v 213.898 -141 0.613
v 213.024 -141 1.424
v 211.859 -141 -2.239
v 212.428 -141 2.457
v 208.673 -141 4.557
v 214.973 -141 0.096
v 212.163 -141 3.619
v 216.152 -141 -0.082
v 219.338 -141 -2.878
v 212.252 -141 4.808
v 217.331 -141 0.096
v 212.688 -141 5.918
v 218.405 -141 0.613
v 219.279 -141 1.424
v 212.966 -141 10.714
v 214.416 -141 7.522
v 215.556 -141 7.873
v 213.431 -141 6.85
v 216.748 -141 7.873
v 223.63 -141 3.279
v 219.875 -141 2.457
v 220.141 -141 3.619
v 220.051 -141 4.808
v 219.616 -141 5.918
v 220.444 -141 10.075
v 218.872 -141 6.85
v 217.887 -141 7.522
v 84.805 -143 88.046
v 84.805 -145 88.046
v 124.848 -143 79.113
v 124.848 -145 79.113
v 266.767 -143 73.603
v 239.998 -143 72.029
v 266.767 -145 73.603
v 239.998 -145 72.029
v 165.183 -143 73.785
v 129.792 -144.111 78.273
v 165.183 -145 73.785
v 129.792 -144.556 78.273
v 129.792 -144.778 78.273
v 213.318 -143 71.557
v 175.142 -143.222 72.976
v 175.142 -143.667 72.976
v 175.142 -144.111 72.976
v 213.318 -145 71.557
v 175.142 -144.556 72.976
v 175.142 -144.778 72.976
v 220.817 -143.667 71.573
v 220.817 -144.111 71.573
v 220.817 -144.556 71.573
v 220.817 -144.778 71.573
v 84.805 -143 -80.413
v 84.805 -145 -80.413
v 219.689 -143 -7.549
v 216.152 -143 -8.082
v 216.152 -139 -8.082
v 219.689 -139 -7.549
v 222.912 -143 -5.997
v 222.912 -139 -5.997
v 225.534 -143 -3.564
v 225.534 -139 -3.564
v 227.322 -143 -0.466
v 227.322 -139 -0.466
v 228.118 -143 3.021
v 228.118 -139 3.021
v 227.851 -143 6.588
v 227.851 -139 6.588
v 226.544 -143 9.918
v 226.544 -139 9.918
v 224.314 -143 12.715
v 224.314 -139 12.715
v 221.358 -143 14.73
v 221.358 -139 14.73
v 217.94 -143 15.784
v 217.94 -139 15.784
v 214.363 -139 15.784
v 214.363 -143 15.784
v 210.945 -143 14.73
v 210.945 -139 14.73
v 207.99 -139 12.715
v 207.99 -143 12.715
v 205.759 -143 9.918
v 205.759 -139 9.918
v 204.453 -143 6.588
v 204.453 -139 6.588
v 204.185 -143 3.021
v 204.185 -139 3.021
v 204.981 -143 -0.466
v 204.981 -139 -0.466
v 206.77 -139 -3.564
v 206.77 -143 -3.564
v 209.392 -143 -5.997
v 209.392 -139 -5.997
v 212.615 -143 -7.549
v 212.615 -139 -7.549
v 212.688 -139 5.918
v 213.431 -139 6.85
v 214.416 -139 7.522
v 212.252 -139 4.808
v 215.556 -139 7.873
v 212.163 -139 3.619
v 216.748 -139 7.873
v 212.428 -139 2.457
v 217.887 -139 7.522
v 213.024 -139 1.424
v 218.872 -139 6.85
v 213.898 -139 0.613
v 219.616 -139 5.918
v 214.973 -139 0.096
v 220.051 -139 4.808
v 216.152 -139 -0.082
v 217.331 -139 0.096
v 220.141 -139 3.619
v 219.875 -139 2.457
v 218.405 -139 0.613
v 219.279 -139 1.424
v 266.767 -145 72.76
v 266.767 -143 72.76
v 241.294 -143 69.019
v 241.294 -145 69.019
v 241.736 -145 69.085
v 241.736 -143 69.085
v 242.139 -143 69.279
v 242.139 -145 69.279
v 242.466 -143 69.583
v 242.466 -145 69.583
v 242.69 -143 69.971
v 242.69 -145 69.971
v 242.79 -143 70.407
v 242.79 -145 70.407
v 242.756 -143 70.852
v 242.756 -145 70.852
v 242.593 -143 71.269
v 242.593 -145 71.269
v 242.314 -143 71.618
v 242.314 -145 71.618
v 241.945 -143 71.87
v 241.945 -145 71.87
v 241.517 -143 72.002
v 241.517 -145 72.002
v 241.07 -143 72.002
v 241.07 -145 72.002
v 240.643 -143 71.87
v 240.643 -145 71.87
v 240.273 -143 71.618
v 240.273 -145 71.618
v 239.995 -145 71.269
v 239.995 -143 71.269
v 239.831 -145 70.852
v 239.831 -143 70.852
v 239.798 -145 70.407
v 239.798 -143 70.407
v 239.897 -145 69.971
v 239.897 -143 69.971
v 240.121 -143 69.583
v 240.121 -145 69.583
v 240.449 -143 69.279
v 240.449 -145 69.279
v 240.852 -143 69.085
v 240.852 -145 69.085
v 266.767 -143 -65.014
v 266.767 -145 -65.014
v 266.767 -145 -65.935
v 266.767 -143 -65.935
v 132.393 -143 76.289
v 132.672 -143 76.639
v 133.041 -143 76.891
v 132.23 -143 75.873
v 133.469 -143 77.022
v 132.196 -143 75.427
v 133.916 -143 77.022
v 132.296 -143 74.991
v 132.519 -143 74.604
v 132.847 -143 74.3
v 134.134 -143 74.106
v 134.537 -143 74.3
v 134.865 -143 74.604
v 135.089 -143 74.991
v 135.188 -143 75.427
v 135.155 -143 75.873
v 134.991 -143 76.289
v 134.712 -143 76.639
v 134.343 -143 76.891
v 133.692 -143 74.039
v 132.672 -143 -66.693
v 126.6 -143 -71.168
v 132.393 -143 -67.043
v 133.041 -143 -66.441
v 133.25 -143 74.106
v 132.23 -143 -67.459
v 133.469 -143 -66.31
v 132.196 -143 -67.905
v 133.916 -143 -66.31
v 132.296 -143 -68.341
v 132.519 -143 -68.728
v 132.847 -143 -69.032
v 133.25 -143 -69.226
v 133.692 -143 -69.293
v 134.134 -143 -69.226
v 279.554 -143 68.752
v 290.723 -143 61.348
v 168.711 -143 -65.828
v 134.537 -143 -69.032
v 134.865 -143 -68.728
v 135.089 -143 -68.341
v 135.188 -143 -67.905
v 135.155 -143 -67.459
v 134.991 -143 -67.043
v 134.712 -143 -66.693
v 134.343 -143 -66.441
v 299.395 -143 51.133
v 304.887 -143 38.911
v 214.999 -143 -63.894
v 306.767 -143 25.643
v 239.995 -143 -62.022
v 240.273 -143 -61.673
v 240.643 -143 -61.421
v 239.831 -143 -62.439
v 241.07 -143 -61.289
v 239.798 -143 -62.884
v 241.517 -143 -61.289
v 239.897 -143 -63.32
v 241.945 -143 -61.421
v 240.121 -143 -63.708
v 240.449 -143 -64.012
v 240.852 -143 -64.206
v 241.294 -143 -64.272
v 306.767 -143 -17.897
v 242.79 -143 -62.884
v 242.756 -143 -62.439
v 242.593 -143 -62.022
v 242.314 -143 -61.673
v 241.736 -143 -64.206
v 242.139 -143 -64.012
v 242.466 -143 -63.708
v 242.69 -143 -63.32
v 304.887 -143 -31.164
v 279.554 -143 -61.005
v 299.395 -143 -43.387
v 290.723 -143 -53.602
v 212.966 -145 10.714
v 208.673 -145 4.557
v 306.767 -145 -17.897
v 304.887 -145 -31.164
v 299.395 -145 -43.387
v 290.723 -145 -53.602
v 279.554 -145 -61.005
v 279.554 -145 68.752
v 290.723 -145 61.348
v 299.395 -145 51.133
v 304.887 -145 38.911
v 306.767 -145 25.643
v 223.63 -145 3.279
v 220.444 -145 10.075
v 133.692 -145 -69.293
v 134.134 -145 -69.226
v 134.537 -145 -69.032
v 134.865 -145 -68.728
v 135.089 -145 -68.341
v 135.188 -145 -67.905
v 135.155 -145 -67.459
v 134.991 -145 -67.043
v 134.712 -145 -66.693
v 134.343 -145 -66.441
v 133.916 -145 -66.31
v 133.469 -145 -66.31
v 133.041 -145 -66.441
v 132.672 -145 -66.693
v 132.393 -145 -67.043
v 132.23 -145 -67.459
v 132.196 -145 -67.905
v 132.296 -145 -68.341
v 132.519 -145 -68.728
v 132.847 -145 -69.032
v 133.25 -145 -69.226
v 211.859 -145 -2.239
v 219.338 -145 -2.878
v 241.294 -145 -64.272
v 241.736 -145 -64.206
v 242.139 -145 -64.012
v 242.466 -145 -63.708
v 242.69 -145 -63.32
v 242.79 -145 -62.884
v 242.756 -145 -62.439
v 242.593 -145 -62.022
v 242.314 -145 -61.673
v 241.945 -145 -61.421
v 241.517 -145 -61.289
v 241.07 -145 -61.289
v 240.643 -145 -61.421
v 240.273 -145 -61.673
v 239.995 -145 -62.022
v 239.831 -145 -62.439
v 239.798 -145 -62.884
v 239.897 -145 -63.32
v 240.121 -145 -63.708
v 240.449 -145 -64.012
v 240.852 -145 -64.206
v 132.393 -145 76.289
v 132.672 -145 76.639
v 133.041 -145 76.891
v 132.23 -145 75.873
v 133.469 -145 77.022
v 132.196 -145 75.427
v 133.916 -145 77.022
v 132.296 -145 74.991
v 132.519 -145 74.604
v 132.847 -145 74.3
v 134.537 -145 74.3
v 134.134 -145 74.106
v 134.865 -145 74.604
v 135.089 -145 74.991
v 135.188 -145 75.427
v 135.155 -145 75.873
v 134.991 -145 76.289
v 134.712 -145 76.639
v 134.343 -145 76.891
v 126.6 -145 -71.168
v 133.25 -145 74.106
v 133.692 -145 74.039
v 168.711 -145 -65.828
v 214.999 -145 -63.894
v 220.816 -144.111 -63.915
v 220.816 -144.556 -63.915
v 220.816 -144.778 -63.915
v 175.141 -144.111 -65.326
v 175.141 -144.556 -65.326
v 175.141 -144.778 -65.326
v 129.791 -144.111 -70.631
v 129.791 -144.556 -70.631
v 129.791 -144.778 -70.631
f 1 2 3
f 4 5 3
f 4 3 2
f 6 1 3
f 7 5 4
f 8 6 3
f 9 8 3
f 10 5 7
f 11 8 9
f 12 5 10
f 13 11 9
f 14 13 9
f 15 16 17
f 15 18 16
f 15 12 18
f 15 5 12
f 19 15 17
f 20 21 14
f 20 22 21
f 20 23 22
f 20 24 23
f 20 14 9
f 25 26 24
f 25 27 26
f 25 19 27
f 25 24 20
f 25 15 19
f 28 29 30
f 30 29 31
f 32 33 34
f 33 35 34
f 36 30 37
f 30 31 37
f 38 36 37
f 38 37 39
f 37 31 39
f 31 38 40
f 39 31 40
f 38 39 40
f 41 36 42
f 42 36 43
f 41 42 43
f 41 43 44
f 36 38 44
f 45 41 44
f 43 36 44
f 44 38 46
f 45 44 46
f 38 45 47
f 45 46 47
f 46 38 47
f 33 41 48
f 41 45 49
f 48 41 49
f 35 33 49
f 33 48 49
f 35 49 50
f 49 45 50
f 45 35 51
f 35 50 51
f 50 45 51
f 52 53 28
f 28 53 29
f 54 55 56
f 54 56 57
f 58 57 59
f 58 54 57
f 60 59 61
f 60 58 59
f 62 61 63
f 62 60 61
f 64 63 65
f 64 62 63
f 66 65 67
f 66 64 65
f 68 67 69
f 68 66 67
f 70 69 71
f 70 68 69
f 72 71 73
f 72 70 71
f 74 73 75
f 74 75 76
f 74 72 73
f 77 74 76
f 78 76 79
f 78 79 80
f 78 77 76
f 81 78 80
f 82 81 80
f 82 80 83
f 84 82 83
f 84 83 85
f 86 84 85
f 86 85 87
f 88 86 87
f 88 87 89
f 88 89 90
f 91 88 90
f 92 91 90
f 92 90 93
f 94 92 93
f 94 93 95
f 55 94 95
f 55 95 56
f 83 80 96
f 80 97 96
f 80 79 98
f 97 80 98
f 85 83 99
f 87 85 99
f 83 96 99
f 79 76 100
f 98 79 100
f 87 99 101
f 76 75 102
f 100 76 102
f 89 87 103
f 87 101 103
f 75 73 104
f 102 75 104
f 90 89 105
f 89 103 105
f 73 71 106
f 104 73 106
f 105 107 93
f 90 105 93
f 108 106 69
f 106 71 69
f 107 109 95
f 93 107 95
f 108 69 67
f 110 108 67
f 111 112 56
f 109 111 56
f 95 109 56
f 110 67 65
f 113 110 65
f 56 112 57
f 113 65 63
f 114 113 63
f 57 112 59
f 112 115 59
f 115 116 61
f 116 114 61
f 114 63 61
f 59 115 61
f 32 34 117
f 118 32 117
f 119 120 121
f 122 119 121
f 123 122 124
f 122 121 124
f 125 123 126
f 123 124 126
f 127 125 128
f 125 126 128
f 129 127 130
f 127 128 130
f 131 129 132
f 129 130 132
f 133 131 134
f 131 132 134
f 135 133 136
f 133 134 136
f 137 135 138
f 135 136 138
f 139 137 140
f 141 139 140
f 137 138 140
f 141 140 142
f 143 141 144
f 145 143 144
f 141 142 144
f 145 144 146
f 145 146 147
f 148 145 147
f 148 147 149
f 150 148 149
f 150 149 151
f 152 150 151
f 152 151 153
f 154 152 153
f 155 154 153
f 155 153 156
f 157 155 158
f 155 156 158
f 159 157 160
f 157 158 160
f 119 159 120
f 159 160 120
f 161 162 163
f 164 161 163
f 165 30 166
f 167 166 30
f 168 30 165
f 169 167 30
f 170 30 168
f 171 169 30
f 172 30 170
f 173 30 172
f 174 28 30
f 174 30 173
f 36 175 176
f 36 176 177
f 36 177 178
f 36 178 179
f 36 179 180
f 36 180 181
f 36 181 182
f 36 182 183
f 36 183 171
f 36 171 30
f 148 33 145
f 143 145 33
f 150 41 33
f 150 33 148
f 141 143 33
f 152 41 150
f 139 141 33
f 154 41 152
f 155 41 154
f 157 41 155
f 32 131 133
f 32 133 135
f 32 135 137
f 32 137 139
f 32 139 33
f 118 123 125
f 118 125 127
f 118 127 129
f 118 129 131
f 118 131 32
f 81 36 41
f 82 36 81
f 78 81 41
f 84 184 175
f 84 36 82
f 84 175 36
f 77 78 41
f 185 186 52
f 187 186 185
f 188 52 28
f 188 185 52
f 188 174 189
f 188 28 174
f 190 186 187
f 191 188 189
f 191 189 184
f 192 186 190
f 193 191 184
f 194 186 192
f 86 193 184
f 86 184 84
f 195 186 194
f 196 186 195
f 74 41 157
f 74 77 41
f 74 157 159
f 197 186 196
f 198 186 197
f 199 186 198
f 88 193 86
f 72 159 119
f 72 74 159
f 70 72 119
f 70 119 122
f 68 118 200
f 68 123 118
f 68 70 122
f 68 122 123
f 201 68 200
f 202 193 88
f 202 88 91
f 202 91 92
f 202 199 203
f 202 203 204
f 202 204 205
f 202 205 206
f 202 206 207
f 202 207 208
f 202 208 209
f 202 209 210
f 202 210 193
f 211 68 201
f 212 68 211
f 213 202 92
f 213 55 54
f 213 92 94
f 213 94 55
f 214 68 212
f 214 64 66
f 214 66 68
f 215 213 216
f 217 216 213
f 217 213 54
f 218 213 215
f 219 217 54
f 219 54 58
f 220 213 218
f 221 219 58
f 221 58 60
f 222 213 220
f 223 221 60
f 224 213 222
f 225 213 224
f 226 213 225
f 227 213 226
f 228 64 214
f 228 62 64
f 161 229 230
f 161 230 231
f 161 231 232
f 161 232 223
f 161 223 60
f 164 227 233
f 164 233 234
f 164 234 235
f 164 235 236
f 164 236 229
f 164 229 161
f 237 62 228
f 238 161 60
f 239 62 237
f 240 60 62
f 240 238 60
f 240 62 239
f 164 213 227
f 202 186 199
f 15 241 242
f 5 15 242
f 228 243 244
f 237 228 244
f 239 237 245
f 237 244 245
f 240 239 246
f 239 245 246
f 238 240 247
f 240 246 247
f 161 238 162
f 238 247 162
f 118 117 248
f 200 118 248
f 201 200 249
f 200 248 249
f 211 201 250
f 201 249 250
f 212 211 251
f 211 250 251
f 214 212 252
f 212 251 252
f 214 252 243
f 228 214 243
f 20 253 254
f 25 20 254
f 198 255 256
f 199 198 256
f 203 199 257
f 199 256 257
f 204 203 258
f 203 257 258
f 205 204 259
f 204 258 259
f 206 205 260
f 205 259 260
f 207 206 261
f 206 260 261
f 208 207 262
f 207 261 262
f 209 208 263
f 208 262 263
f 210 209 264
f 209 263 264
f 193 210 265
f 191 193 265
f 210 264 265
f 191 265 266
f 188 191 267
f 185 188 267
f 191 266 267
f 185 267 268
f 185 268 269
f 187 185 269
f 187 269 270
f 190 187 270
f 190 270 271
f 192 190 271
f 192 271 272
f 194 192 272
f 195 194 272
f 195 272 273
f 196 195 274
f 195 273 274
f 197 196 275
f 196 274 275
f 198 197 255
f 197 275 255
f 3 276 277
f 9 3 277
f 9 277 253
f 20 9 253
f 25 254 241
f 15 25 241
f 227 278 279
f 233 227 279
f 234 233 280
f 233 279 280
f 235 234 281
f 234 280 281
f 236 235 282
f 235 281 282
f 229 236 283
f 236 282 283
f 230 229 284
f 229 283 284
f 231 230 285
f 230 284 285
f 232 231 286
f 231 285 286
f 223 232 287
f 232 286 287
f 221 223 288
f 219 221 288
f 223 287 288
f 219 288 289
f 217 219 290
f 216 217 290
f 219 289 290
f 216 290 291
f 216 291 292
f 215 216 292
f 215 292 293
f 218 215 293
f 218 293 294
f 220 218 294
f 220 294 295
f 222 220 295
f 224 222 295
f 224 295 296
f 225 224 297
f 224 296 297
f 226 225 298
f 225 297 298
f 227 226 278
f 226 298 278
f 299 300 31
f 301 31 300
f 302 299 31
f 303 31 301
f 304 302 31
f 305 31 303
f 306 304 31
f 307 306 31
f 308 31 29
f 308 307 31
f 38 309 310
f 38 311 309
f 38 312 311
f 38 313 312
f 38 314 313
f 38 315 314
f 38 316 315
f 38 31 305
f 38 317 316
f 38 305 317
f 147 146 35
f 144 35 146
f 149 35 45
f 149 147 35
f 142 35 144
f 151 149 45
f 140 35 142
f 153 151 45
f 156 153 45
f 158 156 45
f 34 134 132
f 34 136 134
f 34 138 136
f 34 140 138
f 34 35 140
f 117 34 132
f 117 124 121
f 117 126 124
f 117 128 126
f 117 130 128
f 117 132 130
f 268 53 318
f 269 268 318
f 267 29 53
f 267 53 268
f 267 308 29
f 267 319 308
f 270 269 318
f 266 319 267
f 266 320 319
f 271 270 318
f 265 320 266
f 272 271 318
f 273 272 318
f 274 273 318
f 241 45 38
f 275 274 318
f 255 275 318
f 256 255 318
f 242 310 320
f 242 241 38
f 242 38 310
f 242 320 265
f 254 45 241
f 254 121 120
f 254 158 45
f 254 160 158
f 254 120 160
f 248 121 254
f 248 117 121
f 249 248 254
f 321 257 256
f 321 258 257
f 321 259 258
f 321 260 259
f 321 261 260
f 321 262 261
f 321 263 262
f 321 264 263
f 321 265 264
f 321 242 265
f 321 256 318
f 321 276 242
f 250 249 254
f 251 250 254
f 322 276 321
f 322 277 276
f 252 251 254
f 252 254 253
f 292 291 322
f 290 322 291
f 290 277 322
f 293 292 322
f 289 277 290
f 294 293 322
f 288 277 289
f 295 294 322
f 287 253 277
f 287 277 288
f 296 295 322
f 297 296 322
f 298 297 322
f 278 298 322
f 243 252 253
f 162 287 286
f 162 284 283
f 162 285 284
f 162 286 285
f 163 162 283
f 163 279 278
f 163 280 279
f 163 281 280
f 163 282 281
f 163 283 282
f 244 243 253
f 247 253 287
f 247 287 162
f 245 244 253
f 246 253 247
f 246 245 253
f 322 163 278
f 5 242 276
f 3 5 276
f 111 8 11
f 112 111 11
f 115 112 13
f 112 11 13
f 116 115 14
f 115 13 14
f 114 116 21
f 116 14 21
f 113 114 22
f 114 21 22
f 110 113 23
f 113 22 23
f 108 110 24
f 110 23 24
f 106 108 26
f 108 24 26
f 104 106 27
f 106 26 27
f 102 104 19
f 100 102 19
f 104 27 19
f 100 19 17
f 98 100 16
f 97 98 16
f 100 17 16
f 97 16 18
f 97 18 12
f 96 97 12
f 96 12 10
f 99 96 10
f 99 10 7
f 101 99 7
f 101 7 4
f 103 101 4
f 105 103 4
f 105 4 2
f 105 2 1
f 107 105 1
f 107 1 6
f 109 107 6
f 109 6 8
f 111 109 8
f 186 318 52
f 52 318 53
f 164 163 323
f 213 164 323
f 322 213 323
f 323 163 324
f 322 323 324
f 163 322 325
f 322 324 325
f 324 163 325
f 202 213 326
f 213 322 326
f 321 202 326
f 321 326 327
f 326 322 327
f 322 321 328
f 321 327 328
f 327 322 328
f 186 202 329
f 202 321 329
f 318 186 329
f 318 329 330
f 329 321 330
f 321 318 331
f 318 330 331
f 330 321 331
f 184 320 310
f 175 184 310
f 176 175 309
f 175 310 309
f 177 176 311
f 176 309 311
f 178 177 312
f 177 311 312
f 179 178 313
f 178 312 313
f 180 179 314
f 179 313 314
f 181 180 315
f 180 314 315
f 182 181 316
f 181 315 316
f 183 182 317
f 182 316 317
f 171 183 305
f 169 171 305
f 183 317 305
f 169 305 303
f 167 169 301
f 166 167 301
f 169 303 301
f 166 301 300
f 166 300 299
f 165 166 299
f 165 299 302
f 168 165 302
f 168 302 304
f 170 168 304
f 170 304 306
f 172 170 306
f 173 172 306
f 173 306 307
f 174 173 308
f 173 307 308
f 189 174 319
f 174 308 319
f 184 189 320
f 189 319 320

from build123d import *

# Parameters (mm, degrees)
BOSS_EXTRUDE3_DEPTH = 2
SKETCH5_R           = 1.5
CUT_EXTRUDE1_DEPTH  = 2
SKETCH7_R           = 12
BOSS_EXTRUDE4_DEPTH = 6
CUT_EXTRUDE2_DEPTH  = 4
CUT_EXTRUDE3_REACH  = 321.177
SKETCH9_R           = 4


with BuildPart() as part:
    # Sketch2 → Boss-Extrude3 (new body)
    with BuildSketch(Plane(origin=(0, -145, 0), x_dir=(1, 0, 0), z_dir=(0, 1, 0))):
        with BuildLine():
            Line((266.76742756, -73.602742484), (266.76742756, -72.760276474))
            ThreePointArc((266.76742756, -72.760276474), (295.4188355, -56.546474798), (306.76742756, -25.643400517))
            Line((306.76742756, -25.643400517), (306.76742756, 17.897133595))
            ThreePointArc((306.76742756, 17.897133595), (295.4188355, 48.800207875), (266.76742756, 65.014009552))
            Line((266.76742756, 65.014009552), (266.76742756, 65.935160893))
            add(Edge.make_bspline(
                [(266.76742756, 65.935160893), (259.107155635, 65.341277023), (243.742271939, 64.387770992), (220.806823342, 63.7720731), (197.927488127, 64.011220421), (175.127118785, 65.165170469), (152.40787224, 67.285858288), (129.776603883, 70.444148029), (110.989691022, 74.011185897), (96.0146349, 77.459243676), (88.529196958, 79.398823116), (84.805077121, 80.412721287)],
                knots=[0.001455315, 0.001455315, 0.001455315, 0.001455315, 0.126054107, 0.2506529, 0.375251692, 0.499850484, 0.624449276, 0.749048068, 0.87364686, 0.935946256, 0.998245653, 0.998245653, 0.998245653, 0.998245653], degree=3))
            Line((84.805077121, 80.412721287), (84.805077121, -88.045510644))
            add(Edge.make_bspline(
                [(84.805077121, -88.045510644), (88.529310634, -87.032335524), (96.014951065, -85.094214441), (110.990402818, -81.649056168), (129.777732342, -78.085640943), (152.409330828, -74.931693387), (175.128665838, -72.815352211), (197.928863022, -71.6657552), (220.807845871, -71.43096305), (243.742803934, -72.051009048), (259.107355476, -73.007418463), (266.76742756, -73.602742484)],
                knots=[0.001754687, 0.001754687, 0.001754687, 0.001754687, 0.064054081, 0.126353476, 0.250952265, 0.375551054, 0.500149843, 0.624748632, 0.749347421, 0.873946211, 0.998545, 0.998545, 0.998545, 0.998545], degree=3))
        make_face()
    extrude(amount=BOSS_EXTRUDE3_DEPTH)

    # Sketch5 → Cut-Extrude1 (cut)
    with BuildSketch(Plane.XZ.offset(145)):
        with Locations((241.293747278, 70.518625741)):
            Circle(SKETCH5_R)
        with Locations((133.692207926, 75.539122499)):
            Circle(SKETCH5_R)
        with Locations((133.692207926, -67.792864213)):
            Circle(SKETCH5_R)
        with Locations((241.293747278, -62.772367455)):
            Circle(SKETCH5_R)
    extrude(amount=-CUT_EXTRUDE1_DEPTH, mode=Mode.SUBTRACT)

    # Sketch7 → Boss-Extrude4 (add)
    with BuildSketch(Plane.XZ.offset(145)):
        with Locations((216.15176331, 3.918032565)):
            Circle(SKETCH7_R)
    extrude(amount=-BOSS_EXTRUDE4_DEPTH)

    # Sketch8 → Cut-Extrude2 (cut)
    with BuildSketch(Plane.XZ.offset(145)):
        Polygon((219.337574148, -2.87784432), (223.630070752, 3.279087239), (220.444259915, 10.074964125), (212.965952472, 10.71390945), (208.673455868, 4.556977891), (211.859266705, -2.238898995), align=None)
    extrude(amount=-CUT_EXTRUDE2_DEPTH, mode=Mode.SUBTRACT)

    # Sketch9 → Cut-Extrude3 (cut, up to next)
    with BuildSketch(Plane.XZ.offset(141), mode=Mode.PRIVATE) as cut_extrude3_sk1:
        with Locations((216.15176331, 3.918032565)):
            Circle(SKETCH9_R)
    cut_extrude3_tool1 = extrude(cut_extrude3_sk1.sketch, amount=-CUT_EXTRUDE3_REACH, mode=Mode.PRIVATE) & part.part
    add(cut_extrude3_tool1.solids().sort_by_distance((216.151763, -141, 3.918033))[0], mode=Mode.SUBTRACT)


solid = part.part
